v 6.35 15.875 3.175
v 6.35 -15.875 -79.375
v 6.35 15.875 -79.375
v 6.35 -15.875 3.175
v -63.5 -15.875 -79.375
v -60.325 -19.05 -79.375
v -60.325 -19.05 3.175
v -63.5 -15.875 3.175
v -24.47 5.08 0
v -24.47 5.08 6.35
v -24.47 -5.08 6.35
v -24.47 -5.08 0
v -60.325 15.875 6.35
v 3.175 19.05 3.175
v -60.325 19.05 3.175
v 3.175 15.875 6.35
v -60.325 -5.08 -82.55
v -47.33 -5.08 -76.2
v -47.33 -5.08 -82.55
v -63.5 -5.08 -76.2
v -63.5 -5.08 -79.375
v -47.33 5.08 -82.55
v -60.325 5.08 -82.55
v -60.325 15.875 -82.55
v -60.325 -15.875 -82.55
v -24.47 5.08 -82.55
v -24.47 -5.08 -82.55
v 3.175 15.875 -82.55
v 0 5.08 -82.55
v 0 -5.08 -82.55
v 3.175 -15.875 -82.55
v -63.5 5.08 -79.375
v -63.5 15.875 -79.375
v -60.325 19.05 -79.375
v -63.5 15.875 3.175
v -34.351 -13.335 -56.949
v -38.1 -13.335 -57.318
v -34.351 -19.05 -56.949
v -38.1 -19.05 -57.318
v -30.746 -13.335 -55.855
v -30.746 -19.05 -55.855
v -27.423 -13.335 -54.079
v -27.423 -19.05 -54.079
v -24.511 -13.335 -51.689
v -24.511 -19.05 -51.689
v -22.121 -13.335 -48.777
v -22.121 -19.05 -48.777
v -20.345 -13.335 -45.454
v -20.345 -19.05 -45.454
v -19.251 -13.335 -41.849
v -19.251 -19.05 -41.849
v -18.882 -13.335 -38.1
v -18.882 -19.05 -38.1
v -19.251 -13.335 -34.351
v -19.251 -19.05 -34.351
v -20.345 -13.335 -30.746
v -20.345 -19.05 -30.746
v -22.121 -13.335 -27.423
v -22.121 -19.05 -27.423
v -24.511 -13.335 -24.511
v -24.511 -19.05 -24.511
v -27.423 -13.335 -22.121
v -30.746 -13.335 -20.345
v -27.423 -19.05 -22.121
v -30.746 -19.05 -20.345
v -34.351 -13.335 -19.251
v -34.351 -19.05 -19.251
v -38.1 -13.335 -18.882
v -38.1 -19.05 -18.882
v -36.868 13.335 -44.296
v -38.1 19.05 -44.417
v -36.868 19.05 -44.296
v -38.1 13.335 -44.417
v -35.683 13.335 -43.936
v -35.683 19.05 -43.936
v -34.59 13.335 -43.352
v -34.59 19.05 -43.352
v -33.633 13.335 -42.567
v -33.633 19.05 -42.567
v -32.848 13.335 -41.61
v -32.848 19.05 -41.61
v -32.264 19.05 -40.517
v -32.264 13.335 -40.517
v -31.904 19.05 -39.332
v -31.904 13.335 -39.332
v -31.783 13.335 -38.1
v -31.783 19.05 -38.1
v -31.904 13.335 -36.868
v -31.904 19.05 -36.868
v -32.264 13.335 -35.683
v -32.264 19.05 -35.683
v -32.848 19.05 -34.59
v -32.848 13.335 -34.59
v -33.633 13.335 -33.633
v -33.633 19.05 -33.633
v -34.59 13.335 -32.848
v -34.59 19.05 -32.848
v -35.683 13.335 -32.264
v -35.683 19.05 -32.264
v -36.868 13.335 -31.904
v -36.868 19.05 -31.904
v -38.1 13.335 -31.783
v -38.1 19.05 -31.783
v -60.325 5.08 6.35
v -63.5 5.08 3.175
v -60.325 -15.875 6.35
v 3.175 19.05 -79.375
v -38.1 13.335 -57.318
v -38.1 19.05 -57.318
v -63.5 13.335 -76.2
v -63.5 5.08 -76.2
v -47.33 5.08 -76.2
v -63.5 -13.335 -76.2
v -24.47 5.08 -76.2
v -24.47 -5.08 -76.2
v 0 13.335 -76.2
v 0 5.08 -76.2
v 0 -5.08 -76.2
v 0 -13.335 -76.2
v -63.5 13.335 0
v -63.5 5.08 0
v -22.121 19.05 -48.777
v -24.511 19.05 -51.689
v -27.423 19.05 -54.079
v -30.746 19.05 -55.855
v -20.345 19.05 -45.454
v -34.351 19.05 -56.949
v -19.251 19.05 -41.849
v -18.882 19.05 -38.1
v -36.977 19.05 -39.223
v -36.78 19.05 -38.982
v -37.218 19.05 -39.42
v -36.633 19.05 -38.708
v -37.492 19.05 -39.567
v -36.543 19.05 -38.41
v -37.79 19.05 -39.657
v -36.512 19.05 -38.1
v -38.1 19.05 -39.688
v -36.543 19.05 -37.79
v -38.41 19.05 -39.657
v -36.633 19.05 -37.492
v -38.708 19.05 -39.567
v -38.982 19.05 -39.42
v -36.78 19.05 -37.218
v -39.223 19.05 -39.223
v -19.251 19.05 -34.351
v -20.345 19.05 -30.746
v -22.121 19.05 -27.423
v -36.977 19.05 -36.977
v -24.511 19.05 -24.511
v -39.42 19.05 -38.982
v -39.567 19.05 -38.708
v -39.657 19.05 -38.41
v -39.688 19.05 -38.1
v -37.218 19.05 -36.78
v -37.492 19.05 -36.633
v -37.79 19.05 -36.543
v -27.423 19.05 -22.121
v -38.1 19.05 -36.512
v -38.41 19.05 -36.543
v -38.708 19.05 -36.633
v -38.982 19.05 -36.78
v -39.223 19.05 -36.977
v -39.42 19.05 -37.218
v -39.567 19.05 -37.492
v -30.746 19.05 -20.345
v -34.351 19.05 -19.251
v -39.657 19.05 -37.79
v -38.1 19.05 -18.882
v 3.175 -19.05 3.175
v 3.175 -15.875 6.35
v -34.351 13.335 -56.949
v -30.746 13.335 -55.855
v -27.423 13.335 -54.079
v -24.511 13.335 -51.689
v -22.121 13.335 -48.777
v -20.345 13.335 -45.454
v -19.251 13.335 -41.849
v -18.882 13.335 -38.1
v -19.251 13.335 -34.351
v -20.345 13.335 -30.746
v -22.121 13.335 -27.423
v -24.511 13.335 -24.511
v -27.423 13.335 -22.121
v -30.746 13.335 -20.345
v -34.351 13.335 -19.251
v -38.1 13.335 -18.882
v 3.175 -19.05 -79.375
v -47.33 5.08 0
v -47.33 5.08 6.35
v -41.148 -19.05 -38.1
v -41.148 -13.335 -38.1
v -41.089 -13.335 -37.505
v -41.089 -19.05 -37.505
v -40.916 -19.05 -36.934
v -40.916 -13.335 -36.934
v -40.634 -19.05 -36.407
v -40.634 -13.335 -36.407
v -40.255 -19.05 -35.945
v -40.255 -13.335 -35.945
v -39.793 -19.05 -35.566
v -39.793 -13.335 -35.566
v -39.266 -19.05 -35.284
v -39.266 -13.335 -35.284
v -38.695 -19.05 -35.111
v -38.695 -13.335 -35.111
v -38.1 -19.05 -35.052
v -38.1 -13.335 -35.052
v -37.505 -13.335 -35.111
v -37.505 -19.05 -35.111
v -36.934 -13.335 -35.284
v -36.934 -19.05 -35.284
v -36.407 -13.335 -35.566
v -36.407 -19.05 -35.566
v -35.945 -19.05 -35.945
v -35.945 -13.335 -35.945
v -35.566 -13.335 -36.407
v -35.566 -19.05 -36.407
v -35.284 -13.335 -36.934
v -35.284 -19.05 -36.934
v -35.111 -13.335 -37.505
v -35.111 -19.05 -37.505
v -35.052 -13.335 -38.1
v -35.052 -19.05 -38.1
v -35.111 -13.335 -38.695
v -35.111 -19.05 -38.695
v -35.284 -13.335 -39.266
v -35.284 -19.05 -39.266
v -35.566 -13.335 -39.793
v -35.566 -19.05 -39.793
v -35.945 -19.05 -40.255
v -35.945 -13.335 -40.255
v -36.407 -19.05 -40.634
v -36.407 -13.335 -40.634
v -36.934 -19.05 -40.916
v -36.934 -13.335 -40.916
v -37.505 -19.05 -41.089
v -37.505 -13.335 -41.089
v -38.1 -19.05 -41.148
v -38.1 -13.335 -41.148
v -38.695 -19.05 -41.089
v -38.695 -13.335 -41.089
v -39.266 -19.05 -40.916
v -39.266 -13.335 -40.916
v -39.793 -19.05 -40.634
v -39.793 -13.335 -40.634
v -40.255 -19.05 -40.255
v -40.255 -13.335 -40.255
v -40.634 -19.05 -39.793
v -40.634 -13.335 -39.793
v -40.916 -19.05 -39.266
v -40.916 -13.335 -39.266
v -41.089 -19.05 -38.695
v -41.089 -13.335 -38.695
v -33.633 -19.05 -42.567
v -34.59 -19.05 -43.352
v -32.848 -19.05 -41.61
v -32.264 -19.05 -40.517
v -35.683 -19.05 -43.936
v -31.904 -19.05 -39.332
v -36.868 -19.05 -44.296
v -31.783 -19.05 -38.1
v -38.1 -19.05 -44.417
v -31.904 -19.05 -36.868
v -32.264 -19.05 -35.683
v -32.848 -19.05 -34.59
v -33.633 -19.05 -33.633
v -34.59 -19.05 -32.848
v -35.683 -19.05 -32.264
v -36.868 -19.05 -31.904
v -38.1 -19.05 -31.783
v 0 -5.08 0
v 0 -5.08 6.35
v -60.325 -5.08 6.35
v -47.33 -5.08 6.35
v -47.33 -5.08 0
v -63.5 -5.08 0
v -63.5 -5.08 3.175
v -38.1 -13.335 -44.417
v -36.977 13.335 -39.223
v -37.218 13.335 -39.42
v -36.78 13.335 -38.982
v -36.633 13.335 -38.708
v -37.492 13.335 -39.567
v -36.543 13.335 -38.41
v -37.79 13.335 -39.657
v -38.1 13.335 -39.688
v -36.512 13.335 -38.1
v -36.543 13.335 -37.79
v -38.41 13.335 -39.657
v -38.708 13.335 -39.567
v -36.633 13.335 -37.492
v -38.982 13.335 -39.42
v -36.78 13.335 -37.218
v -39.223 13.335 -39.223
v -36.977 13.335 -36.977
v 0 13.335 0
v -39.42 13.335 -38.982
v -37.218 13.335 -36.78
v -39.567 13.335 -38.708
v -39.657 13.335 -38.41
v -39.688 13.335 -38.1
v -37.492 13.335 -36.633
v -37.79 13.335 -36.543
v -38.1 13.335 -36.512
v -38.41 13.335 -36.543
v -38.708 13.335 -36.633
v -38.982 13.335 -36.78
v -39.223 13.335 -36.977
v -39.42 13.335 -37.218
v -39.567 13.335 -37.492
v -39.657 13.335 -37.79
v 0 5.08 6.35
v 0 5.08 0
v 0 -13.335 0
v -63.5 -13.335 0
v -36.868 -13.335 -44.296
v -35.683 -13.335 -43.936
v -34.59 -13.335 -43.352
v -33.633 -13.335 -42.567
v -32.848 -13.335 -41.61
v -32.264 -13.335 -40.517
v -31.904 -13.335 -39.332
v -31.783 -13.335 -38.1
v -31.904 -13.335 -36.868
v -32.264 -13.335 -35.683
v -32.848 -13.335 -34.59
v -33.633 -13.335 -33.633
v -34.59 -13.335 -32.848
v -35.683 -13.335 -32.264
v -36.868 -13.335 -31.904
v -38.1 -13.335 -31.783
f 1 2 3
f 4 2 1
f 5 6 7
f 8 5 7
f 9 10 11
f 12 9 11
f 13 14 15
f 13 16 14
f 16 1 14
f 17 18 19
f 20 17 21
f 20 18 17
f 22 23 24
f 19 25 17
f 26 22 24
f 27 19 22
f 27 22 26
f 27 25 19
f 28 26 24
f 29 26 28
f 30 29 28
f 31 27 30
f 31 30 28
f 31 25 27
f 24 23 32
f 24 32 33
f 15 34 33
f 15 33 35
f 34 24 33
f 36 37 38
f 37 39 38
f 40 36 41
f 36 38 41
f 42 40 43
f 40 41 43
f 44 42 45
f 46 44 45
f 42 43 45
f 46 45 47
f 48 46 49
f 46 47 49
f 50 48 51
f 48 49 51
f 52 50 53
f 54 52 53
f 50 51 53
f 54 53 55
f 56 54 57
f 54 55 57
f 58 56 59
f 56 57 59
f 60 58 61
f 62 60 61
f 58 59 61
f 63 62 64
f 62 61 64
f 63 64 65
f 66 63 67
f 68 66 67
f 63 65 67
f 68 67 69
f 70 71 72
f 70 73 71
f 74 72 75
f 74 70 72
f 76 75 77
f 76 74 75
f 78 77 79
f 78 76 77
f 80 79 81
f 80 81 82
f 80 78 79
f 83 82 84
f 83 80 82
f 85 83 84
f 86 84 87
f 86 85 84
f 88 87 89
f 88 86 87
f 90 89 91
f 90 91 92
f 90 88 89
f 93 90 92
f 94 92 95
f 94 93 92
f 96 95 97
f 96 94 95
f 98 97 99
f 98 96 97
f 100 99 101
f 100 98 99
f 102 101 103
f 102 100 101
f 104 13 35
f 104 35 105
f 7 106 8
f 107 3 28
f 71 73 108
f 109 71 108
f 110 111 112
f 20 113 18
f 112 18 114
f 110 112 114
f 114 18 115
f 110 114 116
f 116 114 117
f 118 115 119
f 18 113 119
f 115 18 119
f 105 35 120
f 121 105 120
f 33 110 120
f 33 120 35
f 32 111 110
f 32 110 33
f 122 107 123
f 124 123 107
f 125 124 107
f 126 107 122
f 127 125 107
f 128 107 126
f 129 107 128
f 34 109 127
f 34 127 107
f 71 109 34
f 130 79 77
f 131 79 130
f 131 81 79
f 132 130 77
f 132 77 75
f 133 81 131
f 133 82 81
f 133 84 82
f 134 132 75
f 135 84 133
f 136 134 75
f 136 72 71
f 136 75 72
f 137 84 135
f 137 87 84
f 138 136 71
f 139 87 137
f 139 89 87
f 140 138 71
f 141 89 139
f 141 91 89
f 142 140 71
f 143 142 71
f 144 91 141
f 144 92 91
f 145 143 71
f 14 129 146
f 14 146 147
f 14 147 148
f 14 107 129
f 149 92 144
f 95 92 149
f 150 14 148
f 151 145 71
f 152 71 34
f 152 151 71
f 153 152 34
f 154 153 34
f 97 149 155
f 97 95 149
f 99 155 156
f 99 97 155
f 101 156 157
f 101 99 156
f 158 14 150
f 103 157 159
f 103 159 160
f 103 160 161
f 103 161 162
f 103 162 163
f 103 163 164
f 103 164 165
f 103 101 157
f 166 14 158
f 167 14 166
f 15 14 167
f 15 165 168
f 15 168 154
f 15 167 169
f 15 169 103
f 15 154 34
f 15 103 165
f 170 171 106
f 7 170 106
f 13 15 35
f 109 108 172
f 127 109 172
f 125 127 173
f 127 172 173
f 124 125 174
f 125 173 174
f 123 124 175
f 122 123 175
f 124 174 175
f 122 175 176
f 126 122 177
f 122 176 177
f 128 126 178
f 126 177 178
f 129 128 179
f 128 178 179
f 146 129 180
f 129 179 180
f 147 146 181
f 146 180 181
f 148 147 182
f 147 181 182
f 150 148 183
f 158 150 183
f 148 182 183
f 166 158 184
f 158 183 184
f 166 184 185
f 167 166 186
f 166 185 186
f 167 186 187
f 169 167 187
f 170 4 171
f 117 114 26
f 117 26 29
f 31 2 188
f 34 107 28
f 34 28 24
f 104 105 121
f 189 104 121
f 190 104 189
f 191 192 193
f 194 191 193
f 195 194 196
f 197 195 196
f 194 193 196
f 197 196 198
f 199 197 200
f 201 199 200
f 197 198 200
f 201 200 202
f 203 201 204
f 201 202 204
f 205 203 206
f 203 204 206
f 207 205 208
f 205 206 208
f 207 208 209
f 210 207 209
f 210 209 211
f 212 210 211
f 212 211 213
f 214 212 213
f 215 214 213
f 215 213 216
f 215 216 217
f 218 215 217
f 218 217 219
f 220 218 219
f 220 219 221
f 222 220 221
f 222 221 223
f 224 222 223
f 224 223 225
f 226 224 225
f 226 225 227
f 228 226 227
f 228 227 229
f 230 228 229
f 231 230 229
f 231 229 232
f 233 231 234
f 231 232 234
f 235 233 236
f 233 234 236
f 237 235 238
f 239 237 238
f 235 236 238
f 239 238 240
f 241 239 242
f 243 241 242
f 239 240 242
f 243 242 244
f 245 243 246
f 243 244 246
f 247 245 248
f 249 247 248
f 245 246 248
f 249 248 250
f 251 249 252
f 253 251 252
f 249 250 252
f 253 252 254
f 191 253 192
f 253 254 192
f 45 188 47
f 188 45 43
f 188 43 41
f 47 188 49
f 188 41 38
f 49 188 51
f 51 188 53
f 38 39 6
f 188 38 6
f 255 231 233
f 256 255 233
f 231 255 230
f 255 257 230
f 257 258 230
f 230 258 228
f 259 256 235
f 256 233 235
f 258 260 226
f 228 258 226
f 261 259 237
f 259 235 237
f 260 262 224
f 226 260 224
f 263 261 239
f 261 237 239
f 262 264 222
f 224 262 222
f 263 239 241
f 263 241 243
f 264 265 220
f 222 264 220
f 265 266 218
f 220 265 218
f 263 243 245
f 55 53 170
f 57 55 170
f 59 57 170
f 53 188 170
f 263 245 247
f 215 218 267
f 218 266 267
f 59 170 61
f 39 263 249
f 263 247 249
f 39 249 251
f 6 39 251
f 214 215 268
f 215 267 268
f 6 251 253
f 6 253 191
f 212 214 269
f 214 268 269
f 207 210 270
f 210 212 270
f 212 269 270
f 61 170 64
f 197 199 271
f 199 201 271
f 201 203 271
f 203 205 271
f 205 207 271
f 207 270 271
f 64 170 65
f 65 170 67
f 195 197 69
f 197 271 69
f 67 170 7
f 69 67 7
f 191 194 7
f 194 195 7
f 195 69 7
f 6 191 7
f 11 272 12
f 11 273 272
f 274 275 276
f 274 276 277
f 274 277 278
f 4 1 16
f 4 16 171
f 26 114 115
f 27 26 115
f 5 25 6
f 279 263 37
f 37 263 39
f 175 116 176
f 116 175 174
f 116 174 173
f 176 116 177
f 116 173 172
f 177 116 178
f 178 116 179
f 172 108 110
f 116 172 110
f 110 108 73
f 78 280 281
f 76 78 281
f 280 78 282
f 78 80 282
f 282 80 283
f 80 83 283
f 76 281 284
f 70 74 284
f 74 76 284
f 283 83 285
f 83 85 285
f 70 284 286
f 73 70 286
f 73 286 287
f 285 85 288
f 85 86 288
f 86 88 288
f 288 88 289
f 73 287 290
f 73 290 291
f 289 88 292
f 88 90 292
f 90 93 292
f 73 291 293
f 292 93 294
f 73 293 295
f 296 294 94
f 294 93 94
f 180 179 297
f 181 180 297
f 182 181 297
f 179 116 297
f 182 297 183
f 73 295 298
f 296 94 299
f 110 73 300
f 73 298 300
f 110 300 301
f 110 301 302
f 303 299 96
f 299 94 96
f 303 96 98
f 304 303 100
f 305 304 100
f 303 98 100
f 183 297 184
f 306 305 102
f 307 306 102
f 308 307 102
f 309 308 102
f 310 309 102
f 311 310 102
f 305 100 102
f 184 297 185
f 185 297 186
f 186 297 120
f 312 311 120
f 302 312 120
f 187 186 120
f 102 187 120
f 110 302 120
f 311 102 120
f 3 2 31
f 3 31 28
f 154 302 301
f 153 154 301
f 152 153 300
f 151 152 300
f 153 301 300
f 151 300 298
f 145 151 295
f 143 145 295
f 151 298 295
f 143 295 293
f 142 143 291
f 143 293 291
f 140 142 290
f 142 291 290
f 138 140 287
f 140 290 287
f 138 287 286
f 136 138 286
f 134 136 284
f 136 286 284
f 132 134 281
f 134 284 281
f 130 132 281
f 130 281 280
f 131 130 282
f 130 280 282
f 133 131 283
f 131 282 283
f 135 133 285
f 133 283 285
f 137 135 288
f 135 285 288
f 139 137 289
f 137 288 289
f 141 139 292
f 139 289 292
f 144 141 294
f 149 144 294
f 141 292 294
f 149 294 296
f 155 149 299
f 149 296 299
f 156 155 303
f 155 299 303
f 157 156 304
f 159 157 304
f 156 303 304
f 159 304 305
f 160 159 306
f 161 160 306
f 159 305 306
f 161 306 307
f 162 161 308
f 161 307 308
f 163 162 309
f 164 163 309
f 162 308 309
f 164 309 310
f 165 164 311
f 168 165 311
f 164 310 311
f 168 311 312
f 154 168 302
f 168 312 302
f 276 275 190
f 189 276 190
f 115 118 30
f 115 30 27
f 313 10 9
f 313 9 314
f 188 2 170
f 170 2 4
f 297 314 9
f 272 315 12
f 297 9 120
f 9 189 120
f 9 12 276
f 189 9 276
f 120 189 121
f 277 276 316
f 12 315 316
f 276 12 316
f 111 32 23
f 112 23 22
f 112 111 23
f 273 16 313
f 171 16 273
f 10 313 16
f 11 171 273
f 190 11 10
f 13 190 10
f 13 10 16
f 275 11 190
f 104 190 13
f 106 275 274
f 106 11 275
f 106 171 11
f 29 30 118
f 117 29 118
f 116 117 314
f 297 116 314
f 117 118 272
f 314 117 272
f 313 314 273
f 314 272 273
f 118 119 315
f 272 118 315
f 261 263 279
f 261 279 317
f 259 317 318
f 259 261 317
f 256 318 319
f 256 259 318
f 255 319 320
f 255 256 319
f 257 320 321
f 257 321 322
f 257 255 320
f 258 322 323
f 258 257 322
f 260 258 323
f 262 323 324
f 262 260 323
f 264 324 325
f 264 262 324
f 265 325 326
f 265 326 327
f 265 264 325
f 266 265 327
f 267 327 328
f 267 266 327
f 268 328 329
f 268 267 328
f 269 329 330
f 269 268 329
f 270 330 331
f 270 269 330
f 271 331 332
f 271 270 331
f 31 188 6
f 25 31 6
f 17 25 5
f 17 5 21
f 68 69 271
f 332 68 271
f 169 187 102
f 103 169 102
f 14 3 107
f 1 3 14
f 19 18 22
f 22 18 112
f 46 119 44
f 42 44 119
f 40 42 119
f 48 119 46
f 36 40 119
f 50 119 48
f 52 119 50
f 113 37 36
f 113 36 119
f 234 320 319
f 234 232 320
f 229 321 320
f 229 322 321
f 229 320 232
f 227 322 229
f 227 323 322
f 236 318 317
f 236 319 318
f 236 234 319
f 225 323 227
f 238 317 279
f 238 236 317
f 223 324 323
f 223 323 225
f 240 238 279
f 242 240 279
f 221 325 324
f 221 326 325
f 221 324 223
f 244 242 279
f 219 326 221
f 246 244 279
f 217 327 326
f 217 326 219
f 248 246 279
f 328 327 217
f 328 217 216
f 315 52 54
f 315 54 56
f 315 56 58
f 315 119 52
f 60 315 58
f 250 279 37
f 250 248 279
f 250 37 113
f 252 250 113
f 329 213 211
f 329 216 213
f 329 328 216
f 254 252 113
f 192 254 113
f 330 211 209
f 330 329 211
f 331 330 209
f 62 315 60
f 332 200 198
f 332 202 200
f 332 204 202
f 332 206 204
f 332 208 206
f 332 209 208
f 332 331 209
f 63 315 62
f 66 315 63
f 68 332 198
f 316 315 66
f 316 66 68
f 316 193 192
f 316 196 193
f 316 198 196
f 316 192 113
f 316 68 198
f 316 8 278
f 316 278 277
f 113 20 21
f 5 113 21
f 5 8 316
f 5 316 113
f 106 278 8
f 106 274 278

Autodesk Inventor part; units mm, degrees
ref_plane "YZ Plane" through (0, 0, 0) normal (1, 0, 0) x (0, 1, 0)
ref_plane "XZ Plane" through (0, 0, 0) normal (0, 1, 0) x (-1, 0, 0)
ref_plane "XY Plane" through (0, 0, 0) normal (0, 0, 1) x (1, 0, 0)
sketch "Sketch1" plane through (0, 0, 0) normal (0, 1, 0) x (-1, 0, 0)
  line L0 (0, 0) -> (76.2, 0)
  line L1 (76.2, 0) -> (76.2, -76.2)
  line L2 (76.2, -76.2) -> (0, -76.2)
  line L3 (0, -76.2) -> (0, 0)
  line L4 (-6.35, 6.35) -> (76.2, 6.35)
  line L5 (76.2, -82.55) -> (-6.35, -82.55)
  line L6 (-6.35, -82.55) -> (-6.35, 6.35)
  line L7 (76.2, 6.35) -> (63.5, 6.35)
  line L8 (63.5, 6.35) -> (63.5, -82.55)
  line L9 (76.2, -38.1) -> (0, -38.1)
  line L10 (38.1, 0) -> (38.1, -76.2)
  circle A0 centre (38.1, -38.1) radius 3.048
  circle A1 centre (38.1, -38.1) radius 1.5875
  circle A2 centre (38.1, -38.1) radius 6.3171
  circle A3 centre (38.1, -38.1) radius 19.2182
  point P0 (63.5, 0)
  point P1 (63.5, -76.2)
  point P2 (38.1, -57.3182)
  point P3 (38.1, -44.4171)
  point P4 (38.1, -31.7829)
  point P5 (38.1, -18.8818)
  dimension "d0" = 76.2
  dimension "d1" = 76.2
  dimension "d2" = 6.35
  dimension "d3" = 6.35
  dimension "d4" = 6.35
  dimension "d6" = 12.7
  dimension "d7" = 6.096
  dimension "d12" = 3.175
extrude "Extrusion1" add sketch "Sketch1" along normal mid plane 38.1 contours L3 L2 L8 L5 L6 L4 L0 | L0 L10 A3 L9 L3 | L0 L8 L9 A3 L10 | L9 A3 L10 L2 L3 | A3 L9 A2 L10 | L10 A2 L9 A3 | L9 A2 L10 A3 | L8 L2 L10 A3 L9 | A2 L9 A0 L10 | L10 A0 L9 A2 | A3 L10 A2 L9 | L9 A0 L10 A2 | A0 L9 A1 L10 | L10 A1 L9 A0 | A2 L10 A0 L9 | L9 A1 L10 A0 | A1 L9 L10 | L10 L9 A1 | A0 L10 A1 L9 | L9 L10 A1 | L9 A1 L10
extrude "Extrusion2" cut sketch "Sketch1" along normal mid plane 26.67 contours L0 L10 A3 L9 L3 | L0 L8 L9 A3 L10 | L9 A3 L10 L2 L3 | A3 L9 A2 L10 | L10 A2 L9 A3 | L9 A2 L10 A3 | L8 L2 L10 A3 L9 | A2 L9 A0 L10 | L10 A0 L9 A2 | A3 L10 A2 L9 | L9 A0 L10 A2 | A0 L9 A1 L10 | L10 A1 L9 A0 | A2 L10 A0 L9 | L9 A1 L10 A0 | A1 L9 L10 | L10 L9 A1 | A0 L10 A1 L9 | L9 L10 A1 | L9 A1 L10
extrude "Extrusion3" cut sketch "Sketch1" along normal blind 26.67 contours A1 L9 L10 | L10 L9 A1 | L9 L10 A1 | L9 A1 L10
extrude "Extrusion4" cut sketch "Sketch1" against normal blind 26.67 contours A0 L9 A1 L10 | L10 A1 L9 A0 | L9 A1 L10 A0 | A1 L9 L10 | L10 L9 A1 | A0 L10 A1 L9 | L9 L10 A1 | L9 A1 L10
extrude "Extrusion5" cut sketch "Sketch1" along normal mid plane 76.2 contours L10 A2 L9 A3 | L9 A2 L10 A3 picked at (24.03, -33.4265) picked at (23.3428, -39.5255)
chamfer "Chamfer1" distance 3.175 angle 45 12 edges at (6.35, -19.05, -38.1) (6.35, 0, -82.55) (6.35, 19.05, -38.1) (6.35, 0, 6.35) (-28.575, -19.05, 6.35) (-28.575, -19.05, -82.55) (-28.575, 19.05, 6.35) (-28.575, 19.05, -82.55) (-63.5, 0, -82.55) (-63.5, 19.05, -38.1) (-63.5, 0, 6.35) (-63.5, -19.05, -38.1)
sketch "Sketch2" plane through (-60.325, 15.875, 6.35) normal (0, 0, 1) x (1, 0, 0)
  line L0 (60.325, -15.875) -> (-14.3464, -15.875)
  line L1 (-14.3464, -15.875) -> (-14.3464, -10.795)
  line L2 (-3.175, -31.75) -> (-3.175, 0) projected
  line L3 (-14.3464, -10.795) -> (60.325, -10.795)
  line L4 (60.325, -29.21) -> (60.325, -2.54) projected
  line L5 (60.325, -10.795) -> (60.325, -20.955)
  line L6 (60.325, -20.955) -> (-14.3464, -20.955)
  line L7 (-14.3464, -20.955) -> (-14.3464, -15.875)
  line L8 (12.9951, -20.955) -> (12.9951, -10.795)
  line L9 (35.8551, -10.795) -> (35.8551, -20.955)
  dimension "d22" = 5.08
  dimension "d23" = 10.16
  dimension "d26" = 24.4699
  dimension "d27" = 22.86
extrude "Extrusion6" cut sketch "Sketch2" against normal blind 127 contours L4 L6 L9 L0 | L0 L9 L3 L4 | L8 L6 L2 L0 | L0 L2 L3 L8 | L2 L6 L7 L0 | L0 L1 L3 L2
sketch "Sketch3" plane through (-60.325, -15.875, 6.35) normal (0, 0, 1) x (1, 0, 0)
  point P0 (60.325, 15.875)
properties part number "Flywheel Cutting Jig"
